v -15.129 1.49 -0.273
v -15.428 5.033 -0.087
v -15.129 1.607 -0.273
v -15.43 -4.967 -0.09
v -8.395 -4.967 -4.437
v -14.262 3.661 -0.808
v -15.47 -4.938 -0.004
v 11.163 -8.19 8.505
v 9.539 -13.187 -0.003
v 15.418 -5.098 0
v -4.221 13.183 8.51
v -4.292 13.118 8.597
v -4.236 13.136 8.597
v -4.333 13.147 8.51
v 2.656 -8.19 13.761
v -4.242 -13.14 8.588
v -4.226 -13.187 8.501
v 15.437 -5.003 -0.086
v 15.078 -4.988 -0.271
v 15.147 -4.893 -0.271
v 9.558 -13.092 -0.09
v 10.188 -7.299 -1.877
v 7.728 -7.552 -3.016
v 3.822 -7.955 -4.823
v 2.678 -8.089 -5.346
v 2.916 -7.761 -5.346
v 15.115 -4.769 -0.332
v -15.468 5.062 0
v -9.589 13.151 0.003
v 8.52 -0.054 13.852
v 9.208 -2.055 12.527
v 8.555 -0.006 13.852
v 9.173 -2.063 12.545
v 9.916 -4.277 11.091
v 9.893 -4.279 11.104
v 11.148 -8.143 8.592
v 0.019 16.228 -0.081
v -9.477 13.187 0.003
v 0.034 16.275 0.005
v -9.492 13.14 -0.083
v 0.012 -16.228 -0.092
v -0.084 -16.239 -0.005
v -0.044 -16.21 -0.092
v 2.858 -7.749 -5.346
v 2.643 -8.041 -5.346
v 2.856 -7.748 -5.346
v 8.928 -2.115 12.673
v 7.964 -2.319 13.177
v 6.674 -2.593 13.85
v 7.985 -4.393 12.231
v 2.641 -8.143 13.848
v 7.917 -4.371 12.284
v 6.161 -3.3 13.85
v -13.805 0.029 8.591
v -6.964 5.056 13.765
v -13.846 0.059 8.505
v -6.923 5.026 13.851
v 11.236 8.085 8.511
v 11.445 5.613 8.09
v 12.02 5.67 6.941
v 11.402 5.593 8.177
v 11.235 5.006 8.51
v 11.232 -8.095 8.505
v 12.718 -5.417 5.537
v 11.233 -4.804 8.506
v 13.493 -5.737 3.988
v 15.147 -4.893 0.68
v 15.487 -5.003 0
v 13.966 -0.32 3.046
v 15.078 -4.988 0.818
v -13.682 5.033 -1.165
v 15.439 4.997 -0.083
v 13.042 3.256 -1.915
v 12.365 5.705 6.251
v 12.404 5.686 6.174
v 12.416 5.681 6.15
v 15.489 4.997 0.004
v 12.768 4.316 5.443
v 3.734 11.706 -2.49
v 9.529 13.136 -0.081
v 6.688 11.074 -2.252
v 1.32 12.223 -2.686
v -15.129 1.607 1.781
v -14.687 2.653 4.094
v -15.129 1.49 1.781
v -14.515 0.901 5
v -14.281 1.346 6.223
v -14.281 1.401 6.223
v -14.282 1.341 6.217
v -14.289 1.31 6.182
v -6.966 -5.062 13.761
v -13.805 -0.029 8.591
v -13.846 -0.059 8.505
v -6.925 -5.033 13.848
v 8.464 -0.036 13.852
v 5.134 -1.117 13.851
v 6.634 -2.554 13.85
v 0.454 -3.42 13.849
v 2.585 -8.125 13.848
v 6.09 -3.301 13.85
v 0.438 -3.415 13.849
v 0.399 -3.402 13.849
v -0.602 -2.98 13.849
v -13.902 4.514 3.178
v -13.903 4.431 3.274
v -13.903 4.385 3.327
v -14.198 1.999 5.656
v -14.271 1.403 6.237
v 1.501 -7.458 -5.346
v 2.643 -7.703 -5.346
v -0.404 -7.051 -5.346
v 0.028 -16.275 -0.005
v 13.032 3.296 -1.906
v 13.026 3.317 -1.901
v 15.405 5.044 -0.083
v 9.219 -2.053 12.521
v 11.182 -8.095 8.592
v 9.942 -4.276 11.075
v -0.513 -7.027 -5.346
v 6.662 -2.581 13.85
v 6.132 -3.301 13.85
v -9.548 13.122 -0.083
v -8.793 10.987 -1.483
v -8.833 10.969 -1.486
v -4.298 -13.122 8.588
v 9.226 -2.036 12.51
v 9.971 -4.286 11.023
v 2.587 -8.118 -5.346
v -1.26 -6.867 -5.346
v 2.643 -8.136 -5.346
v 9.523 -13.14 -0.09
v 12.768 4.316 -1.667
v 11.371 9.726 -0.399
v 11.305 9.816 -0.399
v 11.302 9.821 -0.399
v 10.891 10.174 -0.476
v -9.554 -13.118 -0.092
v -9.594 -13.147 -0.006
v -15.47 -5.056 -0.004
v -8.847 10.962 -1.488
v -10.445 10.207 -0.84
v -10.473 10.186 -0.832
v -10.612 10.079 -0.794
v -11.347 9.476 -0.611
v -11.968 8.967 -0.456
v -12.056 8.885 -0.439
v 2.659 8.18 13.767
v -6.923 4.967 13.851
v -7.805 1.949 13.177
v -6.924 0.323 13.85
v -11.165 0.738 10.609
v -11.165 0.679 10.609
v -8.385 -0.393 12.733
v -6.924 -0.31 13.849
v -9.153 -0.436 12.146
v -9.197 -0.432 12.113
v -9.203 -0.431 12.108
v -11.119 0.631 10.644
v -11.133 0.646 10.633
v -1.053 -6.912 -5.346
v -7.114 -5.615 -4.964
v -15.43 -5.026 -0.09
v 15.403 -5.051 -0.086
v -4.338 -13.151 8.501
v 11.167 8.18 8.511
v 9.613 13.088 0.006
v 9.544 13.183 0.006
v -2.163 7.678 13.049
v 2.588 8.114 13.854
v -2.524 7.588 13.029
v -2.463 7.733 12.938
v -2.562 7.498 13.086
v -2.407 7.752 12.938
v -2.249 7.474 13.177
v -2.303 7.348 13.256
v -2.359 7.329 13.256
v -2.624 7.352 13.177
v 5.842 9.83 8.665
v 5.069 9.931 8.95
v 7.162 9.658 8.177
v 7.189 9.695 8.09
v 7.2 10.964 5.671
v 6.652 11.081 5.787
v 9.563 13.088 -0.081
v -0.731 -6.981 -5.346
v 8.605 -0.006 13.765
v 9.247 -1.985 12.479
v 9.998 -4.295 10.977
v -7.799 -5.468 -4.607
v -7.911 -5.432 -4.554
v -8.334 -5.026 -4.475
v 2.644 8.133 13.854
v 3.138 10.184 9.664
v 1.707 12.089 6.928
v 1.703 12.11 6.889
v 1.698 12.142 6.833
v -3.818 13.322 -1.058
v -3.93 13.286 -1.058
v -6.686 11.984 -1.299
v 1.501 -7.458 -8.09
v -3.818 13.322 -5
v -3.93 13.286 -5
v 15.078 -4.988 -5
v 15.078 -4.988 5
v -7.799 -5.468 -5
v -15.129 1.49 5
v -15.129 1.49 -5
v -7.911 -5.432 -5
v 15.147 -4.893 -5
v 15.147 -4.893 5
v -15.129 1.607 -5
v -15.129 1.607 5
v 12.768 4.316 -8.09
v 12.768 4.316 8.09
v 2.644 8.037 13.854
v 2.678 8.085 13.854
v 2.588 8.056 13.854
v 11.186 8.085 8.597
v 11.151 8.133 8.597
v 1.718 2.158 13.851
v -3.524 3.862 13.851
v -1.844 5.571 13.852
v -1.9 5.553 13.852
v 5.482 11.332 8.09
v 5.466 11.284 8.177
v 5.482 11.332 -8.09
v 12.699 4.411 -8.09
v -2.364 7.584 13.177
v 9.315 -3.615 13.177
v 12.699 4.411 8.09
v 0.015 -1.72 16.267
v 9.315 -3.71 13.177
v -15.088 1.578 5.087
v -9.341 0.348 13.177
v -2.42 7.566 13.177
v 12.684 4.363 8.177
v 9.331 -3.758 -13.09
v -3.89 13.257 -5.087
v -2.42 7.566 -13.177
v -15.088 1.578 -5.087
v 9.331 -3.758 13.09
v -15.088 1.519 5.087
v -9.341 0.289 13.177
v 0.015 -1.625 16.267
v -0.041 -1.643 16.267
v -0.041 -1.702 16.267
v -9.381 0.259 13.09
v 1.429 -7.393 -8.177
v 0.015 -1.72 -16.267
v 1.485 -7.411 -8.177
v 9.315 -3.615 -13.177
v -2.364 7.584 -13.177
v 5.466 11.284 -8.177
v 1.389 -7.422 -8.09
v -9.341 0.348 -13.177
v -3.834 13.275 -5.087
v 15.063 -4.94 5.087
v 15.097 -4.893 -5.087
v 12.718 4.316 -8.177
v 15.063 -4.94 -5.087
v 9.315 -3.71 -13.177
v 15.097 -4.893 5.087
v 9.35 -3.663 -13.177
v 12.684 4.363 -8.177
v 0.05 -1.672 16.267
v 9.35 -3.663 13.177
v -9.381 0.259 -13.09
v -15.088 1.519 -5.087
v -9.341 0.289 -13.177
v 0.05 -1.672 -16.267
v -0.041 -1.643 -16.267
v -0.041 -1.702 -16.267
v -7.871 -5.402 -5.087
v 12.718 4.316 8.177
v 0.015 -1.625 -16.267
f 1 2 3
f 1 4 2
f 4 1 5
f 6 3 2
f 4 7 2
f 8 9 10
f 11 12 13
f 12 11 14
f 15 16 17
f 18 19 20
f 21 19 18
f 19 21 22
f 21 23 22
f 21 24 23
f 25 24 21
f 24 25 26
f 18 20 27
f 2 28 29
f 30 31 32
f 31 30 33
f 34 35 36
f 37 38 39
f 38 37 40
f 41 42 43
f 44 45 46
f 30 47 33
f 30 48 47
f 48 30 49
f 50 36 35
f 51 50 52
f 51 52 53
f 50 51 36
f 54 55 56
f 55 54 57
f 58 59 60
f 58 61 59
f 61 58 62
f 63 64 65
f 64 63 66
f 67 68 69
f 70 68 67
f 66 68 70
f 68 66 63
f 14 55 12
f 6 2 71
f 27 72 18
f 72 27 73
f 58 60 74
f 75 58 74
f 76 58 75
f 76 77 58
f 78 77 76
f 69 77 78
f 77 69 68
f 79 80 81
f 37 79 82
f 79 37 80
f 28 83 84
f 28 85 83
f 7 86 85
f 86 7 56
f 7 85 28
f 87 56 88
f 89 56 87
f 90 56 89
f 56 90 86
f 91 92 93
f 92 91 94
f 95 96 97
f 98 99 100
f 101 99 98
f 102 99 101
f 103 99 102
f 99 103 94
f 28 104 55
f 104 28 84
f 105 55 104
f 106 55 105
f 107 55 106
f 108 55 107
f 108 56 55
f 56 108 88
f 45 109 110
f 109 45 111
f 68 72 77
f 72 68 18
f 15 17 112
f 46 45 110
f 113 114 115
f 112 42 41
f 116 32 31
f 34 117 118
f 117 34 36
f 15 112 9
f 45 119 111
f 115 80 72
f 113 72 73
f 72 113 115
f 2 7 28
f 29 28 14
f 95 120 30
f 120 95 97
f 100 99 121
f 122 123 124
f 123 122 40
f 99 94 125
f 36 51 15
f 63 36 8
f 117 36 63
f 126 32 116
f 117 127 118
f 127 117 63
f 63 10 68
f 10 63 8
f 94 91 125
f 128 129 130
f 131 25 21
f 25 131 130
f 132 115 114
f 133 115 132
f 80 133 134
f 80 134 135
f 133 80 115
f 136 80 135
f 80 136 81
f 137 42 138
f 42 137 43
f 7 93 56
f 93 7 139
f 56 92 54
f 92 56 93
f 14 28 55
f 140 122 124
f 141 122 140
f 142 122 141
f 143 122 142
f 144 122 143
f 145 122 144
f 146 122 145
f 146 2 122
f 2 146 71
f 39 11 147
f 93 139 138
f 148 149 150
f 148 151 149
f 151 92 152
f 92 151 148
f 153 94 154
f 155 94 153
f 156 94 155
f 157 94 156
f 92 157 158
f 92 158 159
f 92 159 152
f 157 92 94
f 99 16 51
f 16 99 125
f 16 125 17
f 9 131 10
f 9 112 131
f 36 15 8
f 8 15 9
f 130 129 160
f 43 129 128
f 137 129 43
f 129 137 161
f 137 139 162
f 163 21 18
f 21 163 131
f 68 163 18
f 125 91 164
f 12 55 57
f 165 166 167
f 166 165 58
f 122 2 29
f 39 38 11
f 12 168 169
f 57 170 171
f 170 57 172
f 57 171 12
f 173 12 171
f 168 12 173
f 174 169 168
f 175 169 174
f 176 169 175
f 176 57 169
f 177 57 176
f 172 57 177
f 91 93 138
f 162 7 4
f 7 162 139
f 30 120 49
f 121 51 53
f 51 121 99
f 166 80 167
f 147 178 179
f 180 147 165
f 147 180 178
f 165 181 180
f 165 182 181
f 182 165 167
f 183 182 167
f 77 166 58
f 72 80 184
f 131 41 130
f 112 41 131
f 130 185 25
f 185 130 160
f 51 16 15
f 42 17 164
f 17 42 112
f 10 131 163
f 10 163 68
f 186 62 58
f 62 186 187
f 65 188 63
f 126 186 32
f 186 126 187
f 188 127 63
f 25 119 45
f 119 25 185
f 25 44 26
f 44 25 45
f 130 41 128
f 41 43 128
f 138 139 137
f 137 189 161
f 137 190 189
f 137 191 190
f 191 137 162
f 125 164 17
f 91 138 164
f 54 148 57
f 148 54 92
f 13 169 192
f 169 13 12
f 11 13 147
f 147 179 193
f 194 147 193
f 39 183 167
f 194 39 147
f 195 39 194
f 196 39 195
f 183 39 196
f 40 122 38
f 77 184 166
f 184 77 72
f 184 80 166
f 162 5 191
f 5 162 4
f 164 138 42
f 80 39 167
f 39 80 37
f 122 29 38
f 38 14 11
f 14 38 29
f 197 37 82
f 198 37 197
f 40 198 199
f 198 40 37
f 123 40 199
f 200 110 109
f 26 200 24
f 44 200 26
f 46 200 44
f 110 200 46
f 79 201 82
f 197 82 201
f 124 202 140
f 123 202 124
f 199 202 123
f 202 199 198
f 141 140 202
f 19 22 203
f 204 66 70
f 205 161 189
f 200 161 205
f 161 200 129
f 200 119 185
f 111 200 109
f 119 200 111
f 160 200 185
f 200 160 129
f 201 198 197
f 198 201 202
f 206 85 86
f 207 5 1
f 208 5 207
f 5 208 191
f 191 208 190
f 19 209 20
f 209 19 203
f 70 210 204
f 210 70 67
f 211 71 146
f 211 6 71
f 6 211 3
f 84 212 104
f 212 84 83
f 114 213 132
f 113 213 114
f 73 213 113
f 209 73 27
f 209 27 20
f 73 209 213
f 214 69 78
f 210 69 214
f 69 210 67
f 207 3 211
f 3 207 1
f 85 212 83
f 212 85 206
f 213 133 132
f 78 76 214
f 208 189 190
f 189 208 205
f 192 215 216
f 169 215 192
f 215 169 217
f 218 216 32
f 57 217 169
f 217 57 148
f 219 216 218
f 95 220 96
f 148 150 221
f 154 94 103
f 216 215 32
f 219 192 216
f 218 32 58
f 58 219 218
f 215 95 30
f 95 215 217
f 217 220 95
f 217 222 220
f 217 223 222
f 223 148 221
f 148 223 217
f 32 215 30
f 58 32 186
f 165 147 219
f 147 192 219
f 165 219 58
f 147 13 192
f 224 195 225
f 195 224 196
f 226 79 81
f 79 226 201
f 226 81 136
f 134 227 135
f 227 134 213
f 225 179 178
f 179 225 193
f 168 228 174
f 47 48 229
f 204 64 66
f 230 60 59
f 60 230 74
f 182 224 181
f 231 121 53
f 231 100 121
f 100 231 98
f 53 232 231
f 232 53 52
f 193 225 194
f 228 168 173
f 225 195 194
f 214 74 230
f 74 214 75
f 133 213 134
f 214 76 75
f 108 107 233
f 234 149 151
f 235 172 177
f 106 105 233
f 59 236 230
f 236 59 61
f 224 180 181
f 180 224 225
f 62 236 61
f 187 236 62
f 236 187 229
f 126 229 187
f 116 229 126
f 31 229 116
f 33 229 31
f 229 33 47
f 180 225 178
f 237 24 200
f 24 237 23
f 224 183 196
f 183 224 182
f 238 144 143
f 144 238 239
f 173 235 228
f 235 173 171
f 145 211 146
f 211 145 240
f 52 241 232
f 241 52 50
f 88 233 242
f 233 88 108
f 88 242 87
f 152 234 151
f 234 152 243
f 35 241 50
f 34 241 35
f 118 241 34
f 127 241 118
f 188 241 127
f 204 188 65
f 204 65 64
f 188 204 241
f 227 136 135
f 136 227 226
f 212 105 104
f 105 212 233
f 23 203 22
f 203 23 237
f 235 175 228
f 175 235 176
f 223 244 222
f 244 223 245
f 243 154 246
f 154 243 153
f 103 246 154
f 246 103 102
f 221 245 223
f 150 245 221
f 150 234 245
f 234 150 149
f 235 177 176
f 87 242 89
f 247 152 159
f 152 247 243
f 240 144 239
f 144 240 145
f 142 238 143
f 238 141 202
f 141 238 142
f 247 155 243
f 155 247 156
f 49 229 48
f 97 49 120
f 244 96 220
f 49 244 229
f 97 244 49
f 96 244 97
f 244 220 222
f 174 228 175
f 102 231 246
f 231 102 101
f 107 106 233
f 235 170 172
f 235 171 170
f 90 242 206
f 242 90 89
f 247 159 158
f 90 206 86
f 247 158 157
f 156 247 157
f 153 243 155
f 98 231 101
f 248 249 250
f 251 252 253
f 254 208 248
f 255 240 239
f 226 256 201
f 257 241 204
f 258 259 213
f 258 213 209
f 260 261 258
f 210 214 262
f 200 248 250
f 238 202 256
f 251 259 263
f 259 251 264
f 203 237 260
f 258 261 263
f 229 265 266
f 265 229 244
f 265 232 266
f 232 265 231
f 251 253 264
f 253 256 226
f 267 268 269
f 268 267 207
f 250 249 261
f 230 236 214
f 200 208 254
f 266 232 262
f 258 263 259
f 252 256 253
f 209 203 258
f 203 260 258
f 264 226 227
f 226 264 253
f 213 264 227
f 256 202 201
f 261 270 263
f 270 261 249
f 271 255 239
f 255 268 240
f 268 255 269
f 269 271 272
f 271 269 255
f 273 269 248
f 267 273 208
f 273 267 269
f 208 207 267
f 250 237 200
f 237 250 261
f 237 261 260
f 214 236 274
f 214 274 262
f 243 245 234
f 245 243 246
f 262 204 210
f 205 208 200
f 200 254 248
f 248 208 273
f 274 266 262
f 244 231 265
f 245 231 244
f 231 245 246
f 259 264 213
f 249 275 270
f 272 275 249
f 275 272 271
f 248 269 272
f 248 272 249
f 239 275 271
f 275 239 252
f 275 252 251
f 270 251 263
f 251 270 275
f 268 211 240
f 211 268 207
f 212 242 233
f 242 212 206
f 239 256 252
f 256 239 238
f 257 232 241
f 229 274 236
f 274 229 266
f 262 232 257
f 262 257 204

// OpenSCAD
// Auto-generated OpenSCAD file

    inner_points = 10*[[0.9299608274506113, -0.36625251042878015, 1.3090169944285586], [-0.9300308766981566, 0.03182392530465242, -1.3090169944285586], [1.266848278790813, 0.4315612808941218, -0.8090169942043599], [-0.38493553047389745, 1.3227137557713289, 0.5000000001356605], [-3.5024755881594054e-05, -0.16721429274351698, 1.618033988749895], [-1.5047999228086544, 0.15483630882503643, -0.5000000000867447], [1.5047298735611092, -0.48926489394916417, 0.5000000000867447], [-3.502449166371223e-05, -0.16721429238061072, -1.618033988749895], [1.2668482786587043, 0.43156128071266875, 0.809016994545535], [-0.2379166193940685, 0.753611882281222, -1.3090169942911047], [-0.9300308769119134, 0.03182392501105499, 1.3090169943213361], [-1.504799922890302, 0.15483630871289225, 0.4999999999132554], [1.5047298736427568, -0.48926489383702, -0.4999999999132554], [0.929960827664368, -0.3662525101351827, -1.3090169943213361], [1.1198293677926323, 1.0006631544963729, 2.224050943411271e-10], [0.5450603218142434, 1.12367553819821, -0.8090169941856757], [-0.23791661960782534, 0.7536118819876247, 1.3090169944587902], [-1.1679124716822094, 0.952650099854341, 3.023159500514794e-11], [0.5450603216821343, 1.123675538016757, 0.8090169945642192], [-0.38493553039224954, 1.3227137558834732, -0.4999999998643395], [-0.7830119659137325, -0.5372779485911959, 0.4999999998945711], [0.1469838862422994, -0.7363161663457679, 0.8090169943231298], [-0.7830119658320847, -0.5372779484790517, -0.500000000105429], [0.7217529323527971, -0.859328549866152, -1.86841930815973e-11], [0.14698388637440846, -0.7363161661643148, -0.8090169944267651]];

    outer_points = 10*[[0.0003389073222320645, 1.6180338602780315, 0.0005485303033235351], [-0.0003389073222320645, -1.6180338602780315, -0.0005485303033235351], [-1.376497554636943, 0.0, 0.8504636798996249], [0.8504636123728273, -0.0006447818753087883, 1.376497445343067], [0.9513306684223868, 1.3088176418818913, 0.0005730337122140106], [0.950782304855979, -1.309216138996162, -0.0003145069624228003], [-0.950782304855979, 1.309216138996162, 0.0003145069624228003], [-0.9513306684223868, -1.3088176418818913, -0.0005730337122140106], [-0.4251668862145562, 1.3088176418818913, 0.8510367136118389], [-0.42571524978096387, -1.309216138996162, 0.8501491729372022], [1.538946448725346, 0.4996775693623565, 0.00037865771973821793], [1.5387369924811702, -0.5003223512376653, 3.964734842487605e-05], [-1.5387369924811702, 0.5003223512376653, -3.964734842487605e-05], [-1.538946448725346, -0.4996775693623565, -0.00037865771973821793], [-0.688273380108343, 0.4996775693623565, 1.3764577979946422], [-0.6884828363525187, -0.5003223512376653, 1.3761187876233287], [1.1135701062666141, 0.808495290644226, 0.8510763609602638], [1.1132311989443822, -0.8095385696338055, 0.8505278306569404], [0.2628478320698681, 0.808495290644226, 1.3766918213355428], [0.26250892474763604, -0.8095385696338055, 1.3761432910322193], [0.8507222741967461, 0.0, -0.525615460375279], [0.2631064938937868, 0.8091400725195348, -0.5254210843828031], [0.26276758657155475, -0.8088937877584967, -0.5259696146861268], [-0.6880147182844242, 0.5003223512376653, -0.5256551077237038], [-0.6882241745285999, -0.4996775693623565, -0.5259941180950172]];

    // Convex hull for inner set (I)
    module inner_hull() {
        hull() {
            for (p = inner_points) {
                translate(p) sphere(r=0.1);
            }
        }
    }

    // Convex hull for outer set (O) minus inner hull (O \ I)
    module outer_minus_inner() {
        difference() {
            hull() {
                for (p = outer_points) {
                    translate(p) sphere(r=0.1);
                }
            }
            inner_hull(); // Subtract inner hull
        }
    }

    // Convex hull for outer set (O) minus all translated inner hulls
    module outer_minus_AllTranslationInner() {
        difference() {
            hull() {
                for (p = outer_points) {
                    translate(p) sphere(r=0.1);
                }
            }
            hull() {
                translate([0,0,50]) inner_hull();
                translate([0,0,-50]) inner_hull();
            }; // Subtract translated inner hulls
        }
    }

    // Difference between outer_minus_inner and outer_minus_AllTranslationInner
    module outer_minus_inner_diff() {
        difference() {
            // Outer minus inner
            difference() {
                hull() {
                    for (p = outer_points) {
                        translate(p) sphere(r=0.1);
                    }
                }
                inner_hull();
            }

            // Subtract Outer minus AllTranslationInner
            difference() {
                hull() {
                    for (p = outer_points) {
                        translate(p) sphere(r=0.1);
                    }
                }
                hull() {
                    translate([0,0,50]) inner_hull();
                    translate([0,0,-50]) inner_hull();
                };
            }
        }
    }

    // Rendering all with colors applied
    color([1, 0, 0, 0.5]) inner_hull(); // Transparent red
    color([0, 1, 0, 1]) outer_minus_AllTranslationInner(); // Opaque green
    color([1, 1, 0, 1]) outer_minus_inner_diff(); // Opaque yellow
    
